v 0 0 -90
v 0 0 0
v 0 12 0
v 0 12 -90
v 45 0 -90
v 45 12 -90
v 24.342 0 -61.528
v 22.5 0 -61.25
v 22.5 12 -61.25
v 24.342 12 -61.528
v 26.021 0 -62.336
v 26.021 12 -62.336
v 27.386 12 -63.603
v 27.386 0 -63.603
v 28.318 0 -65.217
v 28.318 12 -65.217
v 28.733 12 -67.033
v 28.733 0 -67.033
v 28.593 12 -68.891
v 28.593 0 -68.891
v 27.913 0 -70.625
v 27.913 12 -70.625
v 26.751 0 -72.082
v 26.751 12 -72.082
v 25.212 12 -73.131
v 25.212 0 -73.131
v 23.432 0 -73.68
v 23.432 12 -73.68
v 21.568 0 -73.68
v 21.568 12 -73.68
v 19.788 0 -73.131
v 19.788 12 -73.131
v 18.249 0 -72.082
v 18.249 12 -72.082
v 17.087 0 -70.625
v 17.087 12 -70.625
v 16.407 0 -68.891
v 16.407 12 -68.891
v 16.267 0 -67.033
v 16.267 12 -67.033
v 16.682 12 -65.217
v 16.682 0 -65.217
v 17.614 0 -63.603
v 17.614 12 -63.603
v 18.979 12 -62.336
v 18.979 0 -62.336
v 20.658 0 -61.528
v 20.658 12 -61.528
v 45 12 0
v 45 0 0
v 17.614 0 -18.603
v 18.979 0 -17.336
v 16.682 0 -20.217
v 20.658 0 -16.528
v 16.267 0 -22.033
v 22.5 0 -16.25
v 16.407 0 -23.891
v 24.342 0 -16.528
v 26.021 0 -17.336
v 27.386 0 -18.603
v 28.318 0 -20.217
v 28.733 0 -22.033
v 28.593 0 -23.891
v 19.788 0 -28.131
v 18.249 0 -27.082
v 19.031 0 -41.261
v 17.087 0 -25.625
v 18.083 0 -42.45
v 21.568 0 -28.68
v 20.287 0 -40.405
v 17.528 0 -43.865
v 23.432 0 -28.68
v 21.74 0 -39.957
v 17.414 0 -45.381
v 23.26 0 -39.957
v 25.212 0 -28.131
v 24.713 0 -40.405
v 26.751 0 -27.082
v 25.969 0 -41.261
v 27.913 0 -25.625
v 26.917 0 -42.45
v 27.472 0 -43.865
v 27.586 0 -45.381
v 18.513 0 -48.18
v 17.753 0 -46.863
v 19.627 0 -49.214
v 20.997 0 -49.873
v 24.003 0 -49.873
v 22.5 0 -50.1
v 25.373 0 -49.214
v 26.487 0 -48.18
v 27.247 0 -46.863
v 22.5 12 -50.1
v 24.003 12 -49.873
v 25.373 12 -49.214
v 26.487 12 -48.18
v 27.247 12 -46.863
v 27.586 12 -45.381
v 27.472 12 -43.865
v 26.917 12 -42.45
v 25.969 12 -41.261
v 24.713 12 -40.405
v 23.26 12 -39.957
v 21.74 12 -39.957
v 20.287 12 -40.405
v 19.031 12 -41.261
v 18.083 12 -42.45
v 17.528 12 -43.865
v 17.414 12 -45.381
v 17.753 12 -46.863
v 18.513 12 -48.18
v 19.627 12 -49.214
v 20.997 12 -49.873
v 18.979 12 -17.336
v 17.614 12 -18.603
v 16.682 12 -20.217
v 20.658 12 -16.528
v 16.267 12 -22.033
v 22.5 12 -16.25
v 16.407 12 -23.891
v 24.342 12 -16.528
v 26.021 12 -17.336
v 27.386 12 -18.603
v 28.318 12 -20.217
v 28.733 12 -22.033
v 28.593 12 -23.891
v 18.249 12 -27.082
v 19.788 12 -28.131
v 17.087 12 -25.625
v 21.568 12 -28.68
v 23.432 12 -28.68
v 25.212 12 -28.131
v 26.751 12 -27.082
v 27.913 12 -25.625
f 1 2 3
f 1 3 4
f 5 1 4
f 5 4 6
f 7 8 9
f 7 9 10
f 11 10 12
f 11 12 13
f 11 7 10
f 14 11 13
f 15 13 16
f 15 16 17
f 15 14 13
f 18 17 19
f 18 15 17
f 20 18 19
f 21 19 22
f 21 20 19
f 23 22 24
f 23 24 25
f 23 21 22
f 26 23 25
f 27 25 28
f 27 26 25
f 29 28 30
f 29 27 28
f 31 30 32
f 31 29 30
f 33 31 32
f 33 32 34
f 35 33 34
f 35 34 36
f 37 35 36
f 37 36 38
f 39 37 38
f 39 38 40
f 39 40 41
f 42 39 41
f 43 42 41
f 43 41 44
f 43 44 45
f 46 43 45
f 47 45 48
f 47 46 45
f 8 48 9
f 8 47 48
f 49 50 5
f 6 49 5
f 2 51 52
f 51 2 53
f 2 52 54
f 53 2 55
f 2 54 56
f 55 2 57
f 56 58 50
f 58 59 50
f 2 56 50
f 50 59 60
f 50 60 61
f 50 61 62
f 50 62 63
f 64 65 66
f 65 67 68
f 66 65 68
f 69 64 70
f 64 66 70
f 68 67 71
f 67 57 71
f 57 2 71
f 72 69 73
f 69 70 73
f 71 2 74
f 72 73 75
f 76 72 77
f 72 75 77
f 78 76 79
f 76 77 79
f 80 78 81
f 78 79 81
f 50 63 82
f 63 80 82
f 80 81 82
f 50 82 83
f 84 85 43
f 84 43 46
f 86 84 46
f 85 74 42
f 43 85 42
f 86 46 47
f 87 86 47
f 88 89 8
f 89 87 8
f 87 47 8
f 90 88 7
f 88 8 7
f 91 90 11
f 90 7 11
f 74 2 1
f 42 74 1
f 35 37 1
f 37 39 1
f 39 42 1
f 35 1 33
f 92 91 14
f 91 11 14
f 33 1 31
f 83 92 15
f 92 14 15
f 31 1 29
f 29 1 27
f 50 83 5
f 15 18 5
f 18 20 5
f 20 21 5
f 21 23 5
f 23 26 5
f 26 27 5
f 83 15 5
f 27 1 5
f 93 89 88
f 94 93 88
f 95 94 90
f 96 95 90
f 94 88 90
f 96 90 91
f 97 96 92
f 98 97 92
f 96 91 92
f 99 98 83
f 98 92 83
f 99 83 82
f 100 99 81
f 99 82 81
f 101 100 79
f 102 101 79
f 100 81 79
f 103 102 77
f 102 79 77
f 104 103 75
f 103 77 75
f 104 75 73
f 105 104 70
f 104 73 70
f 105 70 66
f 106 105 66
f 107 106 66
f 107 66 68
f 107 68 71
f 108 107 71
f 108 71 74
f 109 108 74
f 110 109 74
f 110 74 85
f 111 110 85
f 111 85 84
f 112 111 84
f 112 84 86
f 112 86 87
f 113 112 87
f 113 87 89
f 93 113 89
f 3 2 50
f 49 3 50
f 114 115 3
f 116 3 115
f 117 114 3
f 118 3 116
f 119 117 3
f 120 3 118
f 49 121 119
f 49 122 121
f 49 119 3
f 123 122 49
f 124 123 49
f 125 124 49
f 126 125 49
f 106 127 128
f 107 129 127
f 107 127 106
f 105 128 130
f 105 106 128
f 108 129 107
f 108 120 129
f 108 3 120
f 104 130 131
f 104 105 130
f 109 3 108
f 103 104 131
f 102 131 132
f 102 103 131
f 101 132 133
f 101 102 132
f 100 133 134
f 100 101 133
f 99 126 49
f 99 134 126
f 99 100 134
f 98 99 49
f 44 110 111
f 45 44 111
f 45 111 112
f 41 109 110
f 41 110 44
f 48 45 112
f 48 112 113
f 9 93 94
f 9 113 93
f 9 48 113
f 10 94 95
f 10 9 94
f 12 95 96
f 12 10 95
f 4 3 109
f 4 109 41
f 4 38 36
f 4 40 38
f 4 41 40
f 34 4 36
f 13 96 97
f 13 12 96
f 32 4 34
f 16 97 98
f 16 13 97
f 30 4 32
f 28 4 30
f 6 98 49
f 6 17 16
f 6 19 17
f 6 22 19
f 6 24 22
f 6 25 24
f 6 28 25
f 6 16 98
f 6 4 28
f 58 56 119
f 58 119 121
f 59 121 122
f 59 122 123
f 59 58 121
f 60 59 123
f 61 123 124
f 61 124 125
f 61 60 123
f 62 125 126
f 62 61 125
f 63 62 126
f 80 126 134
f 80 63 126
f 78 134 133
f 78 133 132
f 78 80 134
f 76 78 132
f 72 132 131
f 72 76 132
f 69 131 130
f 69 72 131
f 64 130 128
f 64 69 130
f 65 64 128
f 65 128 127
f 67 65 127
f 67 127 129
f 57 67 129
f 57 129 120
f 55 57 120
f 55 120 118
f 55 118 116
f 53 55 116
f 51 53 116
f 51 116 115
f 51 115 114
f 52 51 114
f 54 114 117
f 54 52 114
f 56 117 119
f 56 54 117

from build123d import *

# Parameters (mm, degrees)
SKETCH_1_W              = 45
SKETCH_1_H              = 90
SKETCH_1_R              = 6.25
EXTRUDE_1_DEPTH         = 12
HOLE_WIZARD_M12_1_D     = 10.2
HOLE_WIZARD_M12_1_DEPTH = 29.25
HOLE_WIZARD_M12_1_TIP   = 3.064389157


with BuildPart() as part:
    # 草图1 → 凸台-拉伸1 (new body)
    with BuildSketch(Plane(origin=(0, 0, 0), x_dir=(1, 0, 0), z_dir=(0, 1, 0))):
        with Locations((22.5, 45)):
            Rectangle(SKETCH_1_W, SKETCH_1_H)
        with Locations(Location((22.5, 67.5, 0), (0, 0, 270))):
            Circle(SKETCH_1_R, mode=Mode.SUBTRACT)
        with Locations(Location((22.5, 22.5, 0), (0, 0, 270))):
            Circle(SKETCH_1_R, mode=Mode.SUBTRACT)
    extrude(amount=EXTRUDE_1_DEPTH)

    # M12 螺纹孔1
    with Locations(Plane(origin=(22.5, 12, -45), x_dir=(0, 0, 1), z_dir=(0, 1, 0))):
        with Locations((0, 0)):
            Hole(HOLE_WIZARD_M12_1_D / 2, depth=HOLE_WIZARD_M12_1_DEPTH)
            with Locations((0, 0, -(HOLE_WIZARD_M12_1_DEPTH + HOLE_WIZARD_M12_1_TIP / 2))):  # 118° drill point
                Cone(0, HOLE_WIZARD_M12_1_D / 2, HOLE_WIZARD_M12_1_TIP, mode=Mode.SUBTRACT)


solid = part.part
